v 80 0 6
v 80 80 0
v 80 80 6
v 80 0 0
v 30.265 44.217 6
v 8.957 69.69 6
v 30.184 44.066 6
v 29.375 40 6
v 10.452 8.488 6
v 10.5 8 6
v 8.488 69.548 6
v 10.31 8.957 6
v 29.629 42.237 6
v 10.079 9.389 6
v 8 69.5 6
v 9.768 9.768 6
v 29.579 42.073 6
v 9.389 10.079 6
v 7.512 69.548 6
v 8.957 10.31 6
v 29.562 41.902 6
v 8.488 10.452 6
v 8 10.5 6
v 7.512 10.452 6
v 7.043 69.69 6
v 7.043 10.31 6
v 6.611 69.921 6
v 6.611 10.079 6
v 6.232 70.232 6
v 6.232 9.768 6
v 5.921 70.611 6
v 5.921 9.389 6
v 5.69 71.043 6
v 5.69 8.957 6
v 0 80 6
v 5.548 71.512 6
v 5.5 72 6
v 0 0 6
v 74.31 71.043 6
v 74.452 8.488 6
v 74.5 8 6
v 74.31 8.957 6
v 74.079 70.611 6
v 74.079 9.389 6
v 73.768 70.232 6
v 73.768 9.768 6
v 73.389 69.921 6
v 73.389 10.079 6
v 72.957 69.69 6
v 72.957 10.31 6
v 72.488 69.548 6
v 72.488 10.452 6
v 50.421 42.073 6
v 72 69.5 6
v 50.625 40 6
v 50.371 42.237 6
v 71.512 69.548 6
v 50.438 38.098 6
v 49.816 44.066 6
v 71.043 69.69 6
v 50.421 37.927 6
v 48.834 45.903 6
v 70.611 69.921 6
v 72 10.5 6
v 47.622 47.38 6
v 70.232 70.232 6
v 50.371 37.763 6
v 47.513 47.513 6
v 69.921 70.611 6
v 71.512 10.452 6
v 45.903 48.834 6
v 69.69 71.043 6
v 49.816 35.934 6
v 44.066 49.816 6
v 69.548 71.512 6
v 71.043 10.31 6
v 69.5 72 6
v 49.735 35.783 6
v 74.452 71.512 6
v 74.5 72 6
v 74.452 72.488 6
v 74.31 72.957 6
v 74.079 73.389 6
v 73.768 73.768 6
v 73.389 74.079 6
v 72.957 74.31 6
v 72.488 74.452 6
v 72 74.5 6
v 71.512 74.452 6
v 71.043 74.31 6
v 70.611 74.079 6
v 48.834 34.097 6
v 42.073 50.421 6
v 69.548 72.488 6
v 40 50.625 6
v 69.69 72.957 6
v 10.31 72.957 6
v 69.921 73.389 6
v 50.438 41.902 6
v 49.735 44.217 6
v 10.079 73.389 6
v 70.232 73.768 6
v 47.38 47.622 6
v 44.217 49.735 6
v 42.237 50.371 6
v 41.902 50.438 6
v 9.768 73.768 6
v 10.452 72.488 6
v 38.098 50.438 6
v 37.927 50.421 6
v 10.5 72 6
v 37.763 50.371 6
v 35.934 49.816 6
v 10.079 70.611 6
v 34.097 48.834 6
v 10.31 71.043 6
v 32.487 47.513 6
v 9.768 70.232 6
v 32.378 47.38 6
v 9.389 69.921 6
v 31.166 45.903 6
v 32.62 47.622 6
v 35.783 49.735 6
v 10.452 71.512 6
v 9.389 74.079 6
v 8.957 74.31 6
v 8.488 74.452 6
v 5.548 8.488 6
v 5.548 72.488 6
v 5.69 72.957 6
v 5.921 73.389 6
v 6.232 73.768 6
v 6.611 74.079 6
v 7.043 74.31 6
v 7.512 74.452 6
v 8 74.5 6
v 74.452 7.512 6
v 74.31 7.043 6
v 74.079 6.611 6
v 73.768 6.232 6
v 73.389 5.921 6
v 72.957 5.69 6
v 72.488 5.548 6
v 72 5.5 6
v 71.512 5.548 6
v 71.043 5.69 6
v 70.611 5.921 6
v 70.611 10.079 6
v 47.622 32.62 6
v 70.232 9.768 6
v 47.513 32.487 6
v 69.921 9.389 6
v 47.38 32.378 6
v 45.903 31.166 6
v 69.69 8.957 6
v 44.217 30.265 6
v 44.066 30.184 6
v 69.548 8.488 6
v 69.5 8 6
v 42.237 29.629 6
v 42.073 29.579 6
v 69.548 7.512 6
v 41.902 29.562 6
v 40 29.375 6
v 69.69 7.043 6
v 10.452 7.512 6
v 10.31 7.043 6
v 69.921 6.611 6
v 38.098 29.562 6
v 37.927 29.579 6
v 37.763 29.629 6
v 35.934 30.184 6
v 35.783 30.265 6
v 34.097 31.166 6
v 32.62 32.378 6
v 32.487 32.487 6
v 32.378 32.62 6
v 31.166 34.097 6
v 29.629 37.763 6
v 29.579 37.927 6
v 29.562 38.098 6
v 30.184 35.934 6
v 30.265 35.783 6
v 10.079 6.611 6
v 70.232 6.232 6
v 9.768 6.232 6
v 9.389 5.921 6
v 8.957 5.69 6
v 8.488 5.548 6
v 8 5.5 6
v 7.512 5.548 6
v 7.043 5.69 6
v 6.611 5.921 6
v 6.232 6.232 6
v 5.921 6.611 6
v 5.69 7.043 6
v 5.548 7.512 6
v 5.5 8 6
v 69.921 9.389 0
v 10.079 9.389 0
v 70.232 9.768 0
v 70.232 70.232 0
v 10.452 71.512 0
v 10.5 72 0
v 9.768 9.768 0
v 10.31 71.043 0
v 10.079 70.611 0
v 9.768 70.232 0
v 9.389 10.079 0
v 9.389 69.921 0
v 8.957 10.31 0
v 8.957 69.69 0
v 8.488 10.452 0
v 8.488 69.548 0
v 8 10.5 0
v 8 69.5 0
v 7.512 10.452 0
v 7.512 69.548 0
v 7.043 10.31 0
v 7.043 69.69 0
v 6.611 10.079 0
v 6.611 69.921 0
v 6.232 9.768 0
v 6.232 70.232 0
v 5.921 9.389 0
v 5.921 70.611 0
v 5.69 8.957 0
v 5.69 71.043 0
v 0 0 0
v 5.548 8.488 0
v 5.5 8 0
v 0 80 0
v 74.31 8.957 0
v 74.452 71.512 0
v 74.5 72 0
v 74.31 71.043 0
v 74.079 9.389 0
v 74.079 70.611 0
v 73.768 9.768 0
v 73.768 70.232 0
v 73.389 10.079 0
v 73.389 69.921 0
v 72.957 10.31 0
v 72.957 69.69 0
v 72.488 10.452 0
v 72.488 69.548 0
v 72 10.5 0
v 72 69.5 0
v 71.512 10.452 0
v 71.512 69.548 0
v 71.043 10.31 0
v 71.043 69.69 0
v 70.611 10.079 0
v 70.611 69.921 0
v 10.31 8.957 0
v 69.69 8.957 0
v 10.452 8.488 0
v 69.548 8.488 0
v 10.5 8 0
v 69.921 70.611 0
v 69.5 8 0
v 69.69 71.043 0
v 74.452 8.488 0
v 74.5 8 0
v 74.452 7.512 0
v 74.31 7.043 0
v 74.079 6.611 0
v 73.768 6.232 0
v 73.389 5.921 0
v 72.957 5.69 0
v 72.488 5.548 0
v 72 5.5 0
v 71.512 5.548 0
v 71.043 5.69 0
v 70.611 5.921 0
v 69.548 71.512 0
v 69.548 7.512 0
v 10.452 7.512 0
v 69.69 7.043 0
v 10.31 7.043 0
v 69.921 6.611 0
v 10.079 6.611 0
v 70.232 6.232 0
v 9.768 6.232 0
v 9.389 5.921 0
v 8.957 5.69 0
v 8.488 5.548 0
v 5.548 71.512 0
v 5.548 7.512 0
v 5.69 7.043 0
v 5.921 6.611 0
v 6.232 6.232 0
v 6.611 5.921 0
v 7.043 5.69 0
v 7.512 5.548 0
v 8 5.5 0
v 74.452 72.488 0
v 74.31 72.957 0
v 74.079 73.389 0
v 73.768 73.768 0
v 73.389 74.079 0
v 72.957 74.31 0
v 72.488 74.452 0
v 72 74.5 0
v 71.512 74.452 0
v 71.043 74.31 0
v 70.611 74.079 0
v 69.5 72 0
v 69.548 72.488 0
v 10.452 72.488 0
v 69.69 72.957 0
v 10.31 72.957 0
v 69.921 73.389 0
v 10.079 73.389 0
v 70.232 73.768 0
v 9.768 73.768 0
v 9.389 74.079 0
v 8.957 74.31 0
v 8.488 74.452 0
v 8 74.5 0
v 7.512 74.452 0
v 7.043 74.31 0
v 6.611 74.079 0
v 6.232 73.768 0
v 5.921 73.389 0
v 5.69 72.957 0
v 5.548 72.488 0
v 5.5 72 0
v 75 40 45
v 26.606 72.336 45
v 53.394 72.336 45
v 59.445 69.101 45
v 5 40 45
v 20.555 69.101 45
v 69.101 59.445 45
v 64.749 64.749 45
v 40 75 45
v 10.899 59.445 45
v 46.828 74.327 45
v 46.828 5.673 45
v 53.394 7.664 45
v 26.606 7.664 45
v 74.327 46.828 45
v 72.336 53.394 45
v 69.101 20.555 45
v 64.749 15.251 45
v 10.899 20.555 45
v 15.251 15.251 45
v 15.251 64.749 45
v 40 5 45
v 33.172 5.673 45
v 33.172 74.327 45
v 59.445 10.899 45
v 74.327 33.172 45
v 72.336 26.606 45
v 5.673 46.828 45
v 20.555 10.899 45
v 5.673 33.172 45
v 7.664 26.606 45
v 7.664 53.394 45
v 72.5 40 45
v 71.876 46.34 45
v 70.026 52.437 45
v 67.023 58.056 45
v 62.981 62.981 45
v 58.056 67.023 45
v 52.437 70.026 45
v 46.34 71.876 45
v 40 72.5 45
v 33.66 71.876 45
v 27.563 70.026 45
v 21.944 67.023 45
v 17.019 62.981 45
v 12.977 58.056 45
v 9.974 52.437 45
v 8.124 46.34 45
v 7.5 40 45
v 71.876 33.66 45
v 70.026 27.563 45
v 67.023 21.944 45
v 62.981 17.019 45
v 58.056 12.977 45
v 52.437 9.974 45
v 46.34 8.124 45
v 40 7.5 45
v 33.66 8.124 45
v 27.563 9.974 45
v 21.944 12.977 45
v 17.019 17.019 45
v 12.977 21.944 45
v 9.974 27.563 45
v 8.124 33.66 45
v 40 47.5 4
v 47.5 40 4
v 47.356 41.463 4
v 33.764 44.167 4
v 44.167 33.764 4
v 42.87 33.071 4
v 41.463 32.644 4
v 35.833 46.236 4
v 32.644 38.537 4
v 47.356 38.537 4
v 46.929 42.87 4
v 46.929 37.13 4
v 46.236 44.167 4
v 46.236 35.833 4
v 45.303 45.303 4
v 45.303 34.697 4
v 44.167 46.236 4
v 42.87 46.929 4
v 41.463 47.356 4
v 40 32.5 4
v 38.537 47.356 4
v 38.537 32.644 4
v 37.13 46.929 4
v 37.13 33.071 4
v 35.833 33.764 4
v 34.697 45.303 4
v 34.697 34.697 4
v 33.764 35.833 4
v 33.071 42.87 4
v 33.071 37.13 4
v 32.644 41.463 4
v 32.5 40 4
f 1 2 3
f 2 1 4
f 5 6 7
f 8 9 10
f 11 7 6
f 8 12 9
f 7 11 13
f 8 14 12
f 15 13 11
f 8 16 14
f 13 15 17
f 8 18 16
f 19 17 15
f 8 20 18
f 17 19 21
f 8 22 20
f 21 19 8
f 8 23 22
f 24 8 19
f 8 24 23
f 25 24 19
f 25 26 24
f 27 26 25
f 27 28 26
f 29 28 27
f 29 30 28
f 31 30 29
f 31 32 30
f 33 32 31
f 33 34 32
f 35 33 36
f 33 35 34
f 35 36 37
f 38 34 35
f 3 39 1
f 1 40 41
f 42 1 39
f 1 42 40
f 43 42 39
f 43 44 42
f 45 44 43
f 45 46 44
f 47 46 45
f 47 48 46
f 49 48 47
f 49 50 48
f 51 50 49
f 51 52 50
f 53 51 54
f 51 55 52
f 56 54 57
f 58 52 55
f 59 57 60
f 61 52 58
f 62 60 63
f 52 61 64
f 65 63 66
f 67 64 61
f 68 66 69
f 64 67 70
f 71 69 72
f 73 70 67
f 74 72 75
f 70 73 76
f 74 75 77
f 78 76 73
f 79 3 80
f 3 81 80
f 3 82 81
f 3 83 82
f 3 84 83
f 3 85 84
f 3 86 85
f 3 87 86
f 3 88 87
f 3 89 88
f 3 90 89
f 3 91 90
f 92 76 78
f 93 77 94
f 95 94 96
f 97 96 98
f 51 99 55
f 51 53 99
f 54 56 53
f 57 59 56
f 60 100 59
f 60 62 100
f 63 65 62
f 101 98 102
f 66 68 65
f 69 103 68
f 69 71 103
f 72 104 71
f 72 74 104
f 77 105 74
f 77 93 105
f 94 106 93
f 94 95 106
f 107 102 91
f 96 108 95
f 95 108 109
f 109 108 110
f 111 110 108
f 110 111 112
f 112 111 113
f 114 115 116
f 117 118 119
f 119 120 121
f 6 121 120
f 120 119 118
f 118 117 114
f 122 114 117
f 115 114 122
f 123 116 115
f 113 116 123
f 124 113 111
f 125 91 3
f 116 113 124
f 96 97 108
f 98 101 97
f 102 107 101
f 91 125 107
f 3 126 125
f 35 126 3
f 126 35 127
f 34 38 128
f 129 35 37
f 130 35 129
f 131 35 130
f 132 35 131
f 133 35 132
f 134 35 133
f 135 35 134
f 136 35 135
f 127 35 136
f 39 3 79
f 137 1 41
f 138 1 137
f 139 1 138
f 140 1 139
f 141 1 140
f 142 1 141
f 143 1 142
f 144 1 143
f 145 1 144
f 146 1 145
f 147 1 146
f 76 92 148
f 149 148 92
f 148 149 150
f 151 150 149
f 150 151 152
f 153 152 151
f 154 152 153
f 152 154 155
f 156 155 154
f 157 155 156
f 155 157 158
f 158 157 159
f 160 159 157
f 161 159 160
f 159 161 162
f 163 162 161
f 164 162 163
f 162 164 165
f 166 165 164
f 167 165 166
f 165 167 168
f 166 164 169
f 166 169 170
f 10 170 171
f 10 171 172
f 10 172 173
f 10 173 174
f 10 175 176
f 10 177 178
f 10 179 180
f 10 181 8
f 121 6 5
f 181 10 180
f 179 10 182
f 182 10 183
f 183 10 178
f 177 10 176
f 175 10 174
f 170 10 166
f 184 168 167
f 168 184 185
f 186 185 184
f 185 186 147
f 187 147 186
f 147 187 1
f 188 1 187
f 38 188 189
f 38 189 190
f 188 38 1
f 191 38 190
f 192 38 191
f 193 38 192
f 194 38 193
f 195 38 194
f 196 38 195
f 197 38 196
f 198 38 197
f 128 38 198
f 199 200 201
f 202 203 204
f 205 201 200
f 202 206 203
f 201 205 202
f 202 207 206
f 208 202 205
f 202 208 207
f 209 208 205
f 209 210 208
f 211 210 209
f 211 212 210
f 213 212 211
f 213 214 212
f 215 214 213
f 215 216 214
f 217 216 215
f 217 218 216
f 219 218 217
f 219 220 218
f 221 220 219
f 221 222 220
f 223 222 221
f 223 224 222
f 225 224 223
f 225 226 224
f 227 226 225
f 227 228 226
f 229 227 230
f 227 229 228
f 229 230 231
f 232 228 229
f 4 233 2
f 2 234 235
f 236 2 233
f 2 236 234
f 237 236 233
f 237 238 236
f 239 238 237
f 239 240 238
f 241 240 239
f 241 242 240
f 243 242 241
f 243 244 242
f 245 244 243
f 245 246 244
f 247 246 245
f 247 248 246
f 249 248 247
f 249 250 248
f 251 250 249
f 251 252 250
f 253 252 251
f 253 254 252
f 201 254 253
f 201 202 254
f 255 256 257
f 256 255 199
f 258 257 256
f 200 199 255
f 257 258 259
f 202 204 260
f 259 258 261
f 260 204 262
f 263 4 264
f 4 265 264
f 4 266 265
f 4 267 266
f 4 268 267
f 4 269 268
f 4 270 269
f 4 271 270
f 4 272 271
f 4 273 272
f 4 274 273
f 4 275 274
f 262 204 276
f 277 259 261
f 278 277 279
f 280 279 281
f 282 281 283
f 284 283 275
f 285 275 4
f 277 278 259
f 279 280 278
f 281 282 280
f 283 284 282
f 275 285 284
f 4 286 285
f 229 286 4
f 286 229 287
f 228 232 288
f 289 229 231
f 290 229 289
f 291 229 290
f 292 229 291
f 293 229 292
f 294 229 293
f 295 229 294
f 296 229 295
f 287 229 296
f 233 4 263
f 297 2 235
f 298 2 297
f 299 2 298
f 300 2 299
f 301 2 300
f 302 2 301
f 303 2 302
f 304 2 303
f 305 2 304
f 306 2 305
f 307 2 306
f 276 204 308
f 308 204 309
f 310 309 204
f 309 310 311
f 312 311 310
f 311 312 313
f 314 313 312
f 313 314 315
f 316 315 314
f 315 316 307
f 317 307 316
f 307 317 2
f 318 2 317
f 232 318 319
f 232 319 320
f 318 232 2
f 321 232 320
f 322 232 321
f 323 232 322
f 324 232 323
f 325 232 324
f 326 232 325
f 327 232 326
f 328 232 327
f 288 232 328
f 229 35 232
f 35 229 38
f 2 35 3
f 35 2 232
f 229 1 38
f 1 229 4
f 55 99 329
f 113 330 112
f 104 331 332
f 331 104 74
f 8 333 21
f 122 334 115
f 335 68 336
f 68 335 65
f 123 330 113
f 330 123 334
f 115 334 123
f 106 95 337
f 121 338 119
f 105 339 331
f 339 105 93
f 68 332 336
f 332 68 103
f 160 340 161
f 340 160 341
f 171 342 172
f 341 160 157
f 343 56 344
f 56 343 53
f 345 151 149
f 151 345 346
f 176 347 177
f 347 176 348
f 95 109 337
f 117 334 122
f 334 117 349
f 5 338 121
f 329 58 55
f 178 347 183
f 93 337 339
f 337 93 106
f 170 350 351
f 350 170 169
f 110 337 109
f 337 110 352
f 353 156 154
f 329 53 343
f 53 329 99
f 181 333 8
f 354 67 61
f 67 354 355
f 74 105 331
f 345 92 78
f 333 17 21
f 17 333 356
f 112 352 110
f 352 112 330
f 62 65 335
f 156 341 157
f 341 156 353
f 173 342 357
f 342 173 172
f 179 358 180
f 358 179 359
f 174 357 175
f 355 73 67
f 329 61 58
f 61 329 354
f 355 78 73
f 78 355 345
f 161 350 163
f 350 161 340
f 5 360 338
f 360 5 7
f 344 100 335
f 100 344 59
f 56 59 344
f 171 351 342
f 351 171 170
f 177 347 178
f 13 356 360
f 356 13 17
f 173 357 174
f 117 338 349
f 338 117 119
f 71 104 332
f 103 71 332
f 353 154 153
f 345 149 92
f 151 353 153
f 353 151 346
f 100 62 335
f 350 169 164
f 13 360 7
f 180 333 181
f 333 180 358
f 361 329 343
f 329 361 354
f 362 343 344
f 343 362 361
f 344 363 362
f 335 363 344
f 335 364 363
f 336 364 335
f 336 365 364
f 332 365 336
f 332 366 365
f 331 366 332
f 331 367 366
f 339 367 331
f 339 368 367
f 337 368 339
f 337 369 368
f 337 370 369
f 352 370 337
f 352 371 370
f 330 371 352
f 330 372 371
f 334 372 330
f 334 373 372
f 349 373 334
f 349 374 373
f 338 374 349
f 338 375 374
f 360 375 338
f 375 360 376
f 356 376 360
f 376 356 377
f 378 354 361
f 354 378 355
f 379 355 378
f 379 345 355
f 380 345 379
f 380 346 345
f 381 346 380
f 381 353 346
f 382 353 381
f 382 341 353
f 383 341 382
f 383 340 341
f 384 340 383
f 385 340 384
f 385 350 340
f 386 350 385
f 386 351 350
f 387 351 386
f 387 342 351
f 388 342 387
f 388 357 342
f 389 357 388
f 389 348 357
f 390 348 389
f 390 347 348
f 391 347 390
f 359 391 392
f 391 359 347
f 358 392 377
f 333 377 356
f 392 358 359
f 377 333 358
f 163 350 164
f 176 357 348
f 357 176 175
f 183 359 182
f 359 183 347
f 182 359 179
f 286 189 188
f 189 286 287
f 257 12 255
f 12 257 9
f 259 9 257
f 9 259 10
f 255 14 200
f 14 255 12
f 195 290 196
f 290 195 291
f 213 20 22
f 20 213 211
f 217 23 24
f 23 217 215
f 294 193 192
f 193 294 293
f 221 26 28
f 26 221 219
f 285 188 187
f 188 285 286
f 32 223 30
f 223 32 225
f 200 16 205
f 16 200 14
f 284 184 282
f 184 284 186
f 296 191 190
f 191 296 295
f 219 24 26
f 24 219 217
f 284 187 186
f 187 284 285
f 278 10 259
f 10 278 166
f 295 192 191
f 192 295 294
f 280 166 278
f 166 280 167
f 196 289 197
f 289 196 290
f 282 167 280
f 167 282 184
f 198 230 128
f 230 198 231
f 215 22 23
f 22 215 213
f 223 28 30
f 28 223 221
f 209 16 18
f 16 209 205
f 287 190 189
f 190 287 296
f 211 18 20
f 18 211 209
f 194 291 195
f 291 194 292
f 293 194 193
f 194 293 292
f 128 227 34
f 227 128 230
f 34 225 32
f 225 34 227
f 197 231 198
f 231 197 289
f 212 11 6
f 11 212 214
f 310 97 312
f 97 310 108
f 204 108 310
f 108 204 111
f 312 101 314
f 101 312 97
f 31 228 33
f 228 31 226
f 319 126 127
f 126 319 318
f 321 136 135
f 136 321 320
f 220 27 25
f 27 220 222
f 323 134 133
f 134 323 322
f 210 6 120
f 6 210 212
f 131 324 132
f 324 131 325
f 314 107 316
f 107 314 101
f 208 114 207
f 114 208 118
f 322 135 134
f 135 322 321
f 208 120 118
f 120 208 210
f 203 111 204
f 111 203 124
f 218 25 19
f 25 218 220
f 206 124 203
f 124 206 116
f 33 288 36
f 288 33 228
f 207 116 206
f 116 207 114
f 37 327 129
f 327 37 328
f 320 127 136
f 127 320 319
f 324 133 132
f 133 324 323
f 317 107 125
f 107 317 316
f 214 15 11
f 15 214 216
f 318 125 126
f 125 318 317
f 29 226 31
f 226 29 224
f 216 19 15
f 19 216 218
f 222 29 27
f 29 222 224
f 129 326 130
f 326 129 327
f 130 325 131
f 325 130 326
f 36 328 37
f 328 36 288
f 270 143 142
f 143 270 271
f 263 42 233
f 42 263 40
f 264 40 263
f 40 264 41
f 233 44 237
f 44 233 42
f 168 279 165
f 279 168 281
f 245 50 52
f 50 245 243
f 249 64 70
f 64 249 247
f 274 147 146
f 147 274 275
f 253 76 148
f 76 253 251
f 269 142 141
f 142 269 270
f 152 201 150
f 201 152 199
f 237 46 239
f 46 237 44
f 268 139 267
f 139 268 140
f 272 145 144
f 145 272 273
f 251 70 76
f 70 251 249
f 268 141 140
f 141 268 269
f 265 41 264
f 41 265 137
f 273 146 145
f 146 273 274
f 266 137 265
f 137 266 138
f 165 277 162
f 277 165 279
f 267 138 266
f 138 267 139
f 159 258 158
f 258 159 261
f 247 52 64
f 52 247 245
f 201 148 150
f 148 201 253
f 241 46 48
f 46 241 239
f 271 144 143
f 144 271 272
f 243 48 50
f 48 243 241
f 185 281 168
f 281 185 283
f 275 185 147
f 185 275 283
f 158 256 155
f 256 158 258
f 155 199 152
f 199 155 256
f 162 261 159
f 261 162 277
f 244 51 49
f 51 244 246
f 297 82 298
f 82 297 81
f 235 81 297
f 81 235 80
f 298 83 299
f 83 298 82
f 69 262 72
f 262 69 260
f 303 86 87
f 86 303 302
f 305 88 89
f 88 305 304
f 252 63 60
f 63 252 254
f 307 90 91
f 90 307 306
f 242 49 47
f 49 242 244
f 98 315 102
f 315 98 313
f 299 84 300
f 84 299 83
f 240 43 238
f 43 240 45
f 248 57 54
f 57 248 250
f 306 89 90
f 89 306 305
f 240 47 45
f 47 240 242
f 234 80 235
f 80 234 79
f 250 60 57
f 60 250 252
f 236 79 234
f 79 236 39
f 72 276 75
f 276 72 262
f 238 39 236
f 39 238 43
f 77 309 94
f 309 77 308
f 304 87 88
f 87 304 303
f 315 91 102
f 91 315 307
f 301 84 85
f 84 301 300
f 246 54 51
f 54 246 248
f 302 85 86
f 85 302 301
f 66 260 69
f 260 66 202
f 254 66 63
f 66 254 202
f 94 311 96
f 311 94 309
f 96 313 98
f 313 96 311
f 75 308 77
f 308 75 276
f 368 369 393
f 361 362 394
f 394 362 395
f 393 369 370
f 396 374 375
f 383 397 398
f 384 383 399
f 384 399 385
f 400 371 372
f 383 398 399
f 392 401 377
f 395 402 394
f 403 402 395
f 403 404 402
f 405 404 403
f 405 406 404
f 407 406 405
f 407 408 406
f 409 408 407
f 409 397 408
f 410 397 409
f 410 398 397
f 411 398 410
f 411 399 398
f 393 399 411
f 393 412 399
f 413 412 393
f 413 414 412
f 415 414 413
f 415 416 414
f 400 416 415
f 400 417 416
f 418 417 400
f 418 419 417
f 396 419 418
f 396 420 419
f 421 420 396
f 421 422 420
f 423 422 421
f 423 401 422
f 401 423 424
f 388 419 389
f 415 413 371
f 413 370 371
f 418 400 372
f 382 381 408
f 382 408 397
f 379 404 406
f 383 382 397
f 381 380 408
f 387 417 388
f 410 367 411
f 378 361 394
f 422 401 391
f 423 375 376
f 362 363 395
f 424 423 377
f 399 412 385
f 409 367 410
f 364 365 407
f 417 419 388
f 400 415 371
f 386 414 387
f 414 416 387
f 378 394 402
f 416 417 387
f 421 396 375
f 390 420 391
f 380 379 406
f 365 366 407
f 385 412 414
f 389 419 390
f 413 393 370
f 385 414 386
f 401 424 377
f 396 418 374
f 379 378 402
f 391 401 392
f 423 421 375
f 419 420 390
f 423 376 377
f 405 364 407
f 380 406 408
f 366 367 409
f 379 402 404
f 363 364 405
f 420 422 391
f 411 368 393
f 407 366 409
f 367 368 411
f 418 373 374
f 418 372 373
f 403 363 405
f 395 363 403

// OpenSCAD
$fn = 32;

// ----------------------------------------------------------------------
// Hopper: flanged with square flange
// ----------------------------------------------------------------------

// --- parameters (mm) ---
fl = 80;                  // flange side, X and Y
fl_t = 6;                 // flange thickness
cone_h = 40;              // cone height above the flange
top_d = 70;               // cone mouth diameter
bot_d = 20;               // cone spout diameter
wall = 2.5;               // cone wall thickness
hole_r = 2.5;             // flange hole radius
hole_in = 8;              // hole inset from the corners

bore_d = bot_d - 2 * wall;  // spout bore diameter
total_h = fl_t + cone_h - 1;  // overall height

difference() {
  union() {
    cube([fl, fl, fl_t]);
    translate([fl / 2, fl / 2, fl_t - 1])
      cylinder(h = cone_h, d1 = bot_d, d2 = top_d);
  }
  translate([fl / 2, fl / 2, fl_t - 2])
    cylinder(h = cone_h + 1, d1 = bore_d, d2 = top_d - 2 * wall);
  for (sx = [0, 1], sy = [0, 1])
    translate([sx ? fl - hole_in : hole_in,
               sy ? fl - hole_in : hole_in, -1])
      cylinder(r = hole_r, h = fl_t + 2);
}
